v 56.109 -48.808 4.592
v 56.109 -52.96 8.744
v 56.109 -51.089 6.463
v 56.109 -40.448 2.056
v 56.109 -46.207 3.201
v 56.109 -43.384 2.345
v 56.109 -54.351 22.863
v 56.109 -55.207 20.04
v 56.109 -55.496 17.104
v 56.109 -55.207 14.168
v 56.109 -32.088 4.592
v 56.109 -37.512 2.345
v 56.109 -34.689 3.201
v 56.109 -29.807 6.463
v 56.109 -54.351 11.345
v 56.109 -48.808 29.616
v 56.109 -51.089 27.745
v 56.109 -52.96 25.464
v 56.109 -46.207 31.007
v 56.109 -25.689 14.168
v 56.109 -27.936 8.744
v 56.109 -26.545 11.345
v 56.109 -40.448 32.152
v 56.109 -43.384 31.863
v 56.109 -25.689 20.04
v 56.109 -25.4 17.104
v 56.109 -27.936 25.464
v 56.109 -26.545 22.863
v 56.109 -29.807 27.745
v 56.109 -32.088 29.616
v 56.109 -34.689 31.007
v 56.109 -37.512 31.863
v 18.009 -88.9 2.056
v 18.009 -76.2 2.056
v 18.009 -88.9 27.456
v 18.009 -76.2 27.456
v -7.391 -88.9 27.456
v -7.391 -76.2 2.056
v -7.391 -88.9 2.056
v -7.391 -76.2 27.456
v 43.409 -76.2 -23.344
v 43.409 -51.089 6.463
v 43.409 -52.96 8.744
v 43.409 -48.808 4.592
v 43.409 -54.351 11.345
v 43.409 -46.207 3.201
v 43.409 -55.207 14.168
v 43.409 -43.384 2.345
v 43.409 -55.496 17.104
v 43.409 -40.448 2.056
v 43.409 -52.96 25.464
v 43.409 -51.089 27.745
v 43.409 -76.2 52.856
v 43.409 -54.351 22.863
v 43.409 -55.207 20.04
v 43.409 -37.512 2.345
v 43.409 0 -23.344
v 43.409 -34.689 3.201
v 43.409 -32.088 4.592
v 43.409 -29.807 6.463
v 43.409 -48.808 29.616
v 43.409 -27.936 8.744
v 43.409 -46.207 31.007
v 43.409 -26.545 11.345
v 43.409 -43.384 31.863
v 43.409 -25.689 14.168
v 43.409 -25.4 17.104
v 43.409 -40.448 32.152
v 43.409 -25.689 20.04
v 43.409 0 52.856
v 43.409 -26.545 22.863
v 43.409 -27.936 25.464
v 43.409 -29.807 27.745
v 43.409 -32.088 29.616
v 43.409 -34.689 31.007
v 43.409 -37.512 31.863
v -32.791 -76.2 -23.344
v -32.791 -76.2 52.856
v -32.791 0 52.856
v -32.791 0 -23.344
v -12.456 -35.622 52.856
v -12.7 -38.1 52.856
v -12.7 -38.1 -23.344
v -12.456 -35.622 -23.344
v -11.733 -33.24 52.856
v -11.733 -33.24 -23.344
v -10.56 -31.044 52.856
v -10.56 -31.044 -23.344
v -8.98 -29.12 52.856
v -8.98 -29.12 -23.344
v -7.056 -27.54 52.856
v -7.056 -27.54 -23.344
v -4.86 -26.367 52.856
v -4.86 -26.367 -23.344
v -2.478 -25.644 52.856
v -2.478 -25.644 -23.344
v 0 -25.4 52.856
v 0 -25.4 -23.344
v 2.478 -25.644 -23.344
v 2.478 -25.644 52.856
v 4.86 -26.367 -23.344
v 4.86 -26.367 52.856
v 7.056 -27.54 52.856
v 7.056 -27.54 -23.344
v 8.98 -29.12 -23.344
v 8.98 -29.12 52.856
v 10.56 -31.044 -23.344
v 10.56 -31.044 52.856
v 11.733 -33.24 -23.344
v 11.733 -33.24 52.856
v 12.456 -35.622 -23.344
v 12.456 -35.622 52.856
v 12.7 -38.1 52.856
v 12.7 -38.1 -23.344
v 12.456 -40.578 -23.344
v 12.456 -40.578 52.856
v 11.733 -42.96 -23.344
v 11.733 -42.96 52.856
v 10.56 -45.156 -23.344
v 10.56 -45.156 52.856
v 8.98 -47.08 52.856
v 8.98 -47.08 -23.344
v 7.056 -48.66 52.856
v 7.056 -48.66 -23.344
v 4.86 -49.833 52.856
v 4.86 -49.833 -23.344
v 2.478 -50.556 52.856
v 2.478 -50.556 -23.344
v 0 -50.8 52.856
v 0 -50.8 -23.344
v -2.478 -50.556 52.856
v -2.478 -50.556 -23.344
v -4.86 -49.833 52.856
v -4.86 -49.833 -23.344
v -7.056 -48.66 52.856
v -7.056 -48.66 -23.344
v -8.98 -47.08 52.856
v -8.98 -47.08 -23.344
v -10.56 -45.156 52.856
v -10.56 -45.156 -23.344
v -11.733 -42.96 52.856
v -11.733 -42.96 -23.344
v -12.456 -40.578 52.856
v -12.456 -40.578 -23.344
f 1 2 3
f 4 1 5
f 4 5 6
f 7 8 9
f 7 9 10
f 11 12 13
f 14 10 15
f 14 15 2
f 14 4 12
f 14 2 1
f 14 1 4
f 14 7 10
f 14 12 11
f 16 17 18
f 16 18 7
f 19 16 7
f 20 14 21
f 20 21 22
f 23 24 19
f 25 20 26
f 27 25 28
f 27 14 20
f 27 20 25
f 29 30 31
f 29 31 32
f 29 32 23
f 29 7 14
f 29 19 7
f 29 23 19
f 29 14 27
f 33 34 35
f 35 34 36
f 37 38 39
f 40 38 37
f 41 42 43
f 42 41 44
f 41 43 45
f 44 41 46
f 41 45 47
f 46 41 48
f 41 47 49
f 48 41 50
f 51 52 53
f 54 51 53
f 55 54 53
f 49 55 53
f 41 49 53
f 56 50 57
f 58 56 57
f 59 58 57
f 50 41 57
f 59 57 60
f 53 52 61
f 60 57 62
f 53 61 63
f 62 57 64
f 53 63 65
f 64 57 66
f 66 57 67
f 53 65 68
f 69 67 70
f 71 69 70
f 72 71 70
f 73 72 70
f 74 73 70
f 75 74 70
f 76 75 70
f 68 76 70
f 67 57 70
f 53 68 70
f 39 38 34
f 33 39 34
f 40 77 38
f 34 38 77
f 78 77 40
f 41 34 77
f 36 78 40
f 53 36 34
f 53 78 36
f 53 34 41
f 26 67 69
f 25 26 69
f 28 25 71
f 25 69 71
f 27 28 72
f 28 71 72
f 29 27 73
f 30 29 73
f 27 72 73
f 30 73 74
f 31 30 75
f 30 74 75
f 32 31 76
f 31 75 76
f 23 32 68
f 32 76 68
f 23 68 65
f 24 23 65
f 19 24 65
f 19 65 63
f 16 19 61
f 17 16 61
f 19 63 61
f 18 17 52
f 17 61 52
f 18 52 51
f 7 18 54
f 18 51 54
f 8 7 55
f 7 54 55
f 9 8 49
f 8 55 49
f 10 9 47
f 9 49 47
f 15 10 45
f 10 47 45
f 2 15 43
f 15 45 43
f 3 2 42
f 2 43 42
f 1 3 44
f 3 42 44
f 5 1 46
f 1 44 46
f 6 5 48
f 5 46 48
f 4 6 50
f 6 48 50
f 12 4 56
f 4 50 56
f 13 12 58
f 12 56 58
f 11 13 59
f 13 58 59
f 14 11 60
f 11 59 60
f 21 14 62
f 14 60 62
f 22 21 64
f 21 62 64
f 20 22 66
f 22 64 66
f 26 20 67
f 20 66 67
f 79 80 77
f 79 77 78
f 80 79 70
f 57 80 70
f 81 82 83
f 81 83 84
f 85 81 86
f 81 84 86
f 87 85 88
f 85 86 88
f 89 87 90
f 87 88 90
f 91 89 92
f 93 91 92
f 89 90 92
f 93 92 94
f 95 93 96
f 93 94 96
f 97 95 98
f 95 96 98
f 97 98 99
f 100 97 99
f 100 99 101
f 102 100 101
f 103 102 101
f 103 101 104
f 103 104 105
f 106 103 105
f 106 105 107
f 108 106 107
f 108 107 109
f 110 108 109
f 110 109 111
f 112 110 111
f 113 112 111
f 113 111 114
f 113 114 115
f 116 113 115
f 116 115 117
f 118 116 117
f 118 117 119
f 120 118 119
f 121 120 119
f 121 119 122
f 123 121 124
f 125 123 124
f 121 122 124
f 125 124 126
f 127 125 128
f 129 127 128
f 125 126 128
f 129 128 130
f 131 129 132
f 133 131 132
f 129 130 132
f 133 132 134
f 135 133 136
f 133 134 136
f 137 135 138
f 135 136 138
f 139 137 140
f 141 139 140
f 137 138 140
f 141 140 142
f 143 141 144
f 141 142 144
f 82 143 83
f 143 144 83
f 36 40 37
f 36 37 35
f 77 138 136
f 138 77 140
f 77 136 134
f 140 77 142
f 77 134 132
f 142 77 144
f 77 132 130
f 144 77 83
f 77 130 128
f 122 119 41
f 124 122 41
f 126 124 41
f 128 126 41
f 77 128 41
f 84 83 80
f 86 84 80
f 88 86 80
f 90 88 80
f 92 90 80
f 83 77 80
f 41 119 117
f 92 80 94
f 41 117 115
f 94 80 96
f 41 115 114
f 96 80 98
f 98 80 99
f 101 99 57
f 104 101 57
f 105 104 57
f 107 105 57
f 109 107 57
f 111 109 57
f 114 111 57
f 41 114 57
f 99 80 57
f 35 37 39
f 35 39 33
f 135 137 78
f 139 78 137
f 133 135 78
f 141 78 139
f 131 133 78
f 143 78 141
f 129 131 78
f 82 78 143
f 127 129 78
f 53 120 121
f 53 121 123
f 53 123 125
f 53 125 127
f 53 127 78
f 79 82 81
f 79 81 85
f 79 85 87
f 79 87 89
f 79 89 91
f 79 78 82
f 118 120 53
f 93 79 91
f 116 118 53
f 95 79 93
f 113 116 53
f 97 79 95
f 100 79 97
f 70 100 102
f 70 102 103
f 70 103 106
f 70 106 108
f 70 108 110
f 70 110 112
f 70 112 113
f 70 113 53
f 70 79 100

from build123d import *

# Parameters (mm, degrees)
F0_W     = 76.2
F0_H     = 76.2
F1_DEPTH = 76.2
F2_W     = 25.4
F2_H     = 25.4
F3_DEPTH = 12.7
F5_D     = 25.4
F6_R     = 15.048086
F7_DEPTH = 12.7


with BuildPart() as f1:
    # F0 (on Front) → F1 (new body)
    with BuildSketch(Plane.XZ):
        with Locations((5.308721, 14.755955)):
            Rectangle(F0_W, F0_H)
    extrude(amount=F1_DEPTH)

    # F2 (on face) → F3 (join)
    with BuildSketch(Plane.XZ.offset(76.2)):
        with Locations((5.308721, 14.755955)):
            Rectangle(F2_W, F2_H)
    extrude(amount=F3_DEPTH)

    # F5 (through all)
    with Locations(Plane.XY.offset(52.855955)):
        with Locations((0, -38.1)):
            Hole(F5_D / 2)

    # F6 (on face) → F7 (join)
    with BuildSketch(Plane.YZ.offset(43.408721)):
        with Locations((-40.448086, 17.104041)):
            Circle(F6_R)
    extrude(amount=F7_DEPTH)


solid = f1.part
